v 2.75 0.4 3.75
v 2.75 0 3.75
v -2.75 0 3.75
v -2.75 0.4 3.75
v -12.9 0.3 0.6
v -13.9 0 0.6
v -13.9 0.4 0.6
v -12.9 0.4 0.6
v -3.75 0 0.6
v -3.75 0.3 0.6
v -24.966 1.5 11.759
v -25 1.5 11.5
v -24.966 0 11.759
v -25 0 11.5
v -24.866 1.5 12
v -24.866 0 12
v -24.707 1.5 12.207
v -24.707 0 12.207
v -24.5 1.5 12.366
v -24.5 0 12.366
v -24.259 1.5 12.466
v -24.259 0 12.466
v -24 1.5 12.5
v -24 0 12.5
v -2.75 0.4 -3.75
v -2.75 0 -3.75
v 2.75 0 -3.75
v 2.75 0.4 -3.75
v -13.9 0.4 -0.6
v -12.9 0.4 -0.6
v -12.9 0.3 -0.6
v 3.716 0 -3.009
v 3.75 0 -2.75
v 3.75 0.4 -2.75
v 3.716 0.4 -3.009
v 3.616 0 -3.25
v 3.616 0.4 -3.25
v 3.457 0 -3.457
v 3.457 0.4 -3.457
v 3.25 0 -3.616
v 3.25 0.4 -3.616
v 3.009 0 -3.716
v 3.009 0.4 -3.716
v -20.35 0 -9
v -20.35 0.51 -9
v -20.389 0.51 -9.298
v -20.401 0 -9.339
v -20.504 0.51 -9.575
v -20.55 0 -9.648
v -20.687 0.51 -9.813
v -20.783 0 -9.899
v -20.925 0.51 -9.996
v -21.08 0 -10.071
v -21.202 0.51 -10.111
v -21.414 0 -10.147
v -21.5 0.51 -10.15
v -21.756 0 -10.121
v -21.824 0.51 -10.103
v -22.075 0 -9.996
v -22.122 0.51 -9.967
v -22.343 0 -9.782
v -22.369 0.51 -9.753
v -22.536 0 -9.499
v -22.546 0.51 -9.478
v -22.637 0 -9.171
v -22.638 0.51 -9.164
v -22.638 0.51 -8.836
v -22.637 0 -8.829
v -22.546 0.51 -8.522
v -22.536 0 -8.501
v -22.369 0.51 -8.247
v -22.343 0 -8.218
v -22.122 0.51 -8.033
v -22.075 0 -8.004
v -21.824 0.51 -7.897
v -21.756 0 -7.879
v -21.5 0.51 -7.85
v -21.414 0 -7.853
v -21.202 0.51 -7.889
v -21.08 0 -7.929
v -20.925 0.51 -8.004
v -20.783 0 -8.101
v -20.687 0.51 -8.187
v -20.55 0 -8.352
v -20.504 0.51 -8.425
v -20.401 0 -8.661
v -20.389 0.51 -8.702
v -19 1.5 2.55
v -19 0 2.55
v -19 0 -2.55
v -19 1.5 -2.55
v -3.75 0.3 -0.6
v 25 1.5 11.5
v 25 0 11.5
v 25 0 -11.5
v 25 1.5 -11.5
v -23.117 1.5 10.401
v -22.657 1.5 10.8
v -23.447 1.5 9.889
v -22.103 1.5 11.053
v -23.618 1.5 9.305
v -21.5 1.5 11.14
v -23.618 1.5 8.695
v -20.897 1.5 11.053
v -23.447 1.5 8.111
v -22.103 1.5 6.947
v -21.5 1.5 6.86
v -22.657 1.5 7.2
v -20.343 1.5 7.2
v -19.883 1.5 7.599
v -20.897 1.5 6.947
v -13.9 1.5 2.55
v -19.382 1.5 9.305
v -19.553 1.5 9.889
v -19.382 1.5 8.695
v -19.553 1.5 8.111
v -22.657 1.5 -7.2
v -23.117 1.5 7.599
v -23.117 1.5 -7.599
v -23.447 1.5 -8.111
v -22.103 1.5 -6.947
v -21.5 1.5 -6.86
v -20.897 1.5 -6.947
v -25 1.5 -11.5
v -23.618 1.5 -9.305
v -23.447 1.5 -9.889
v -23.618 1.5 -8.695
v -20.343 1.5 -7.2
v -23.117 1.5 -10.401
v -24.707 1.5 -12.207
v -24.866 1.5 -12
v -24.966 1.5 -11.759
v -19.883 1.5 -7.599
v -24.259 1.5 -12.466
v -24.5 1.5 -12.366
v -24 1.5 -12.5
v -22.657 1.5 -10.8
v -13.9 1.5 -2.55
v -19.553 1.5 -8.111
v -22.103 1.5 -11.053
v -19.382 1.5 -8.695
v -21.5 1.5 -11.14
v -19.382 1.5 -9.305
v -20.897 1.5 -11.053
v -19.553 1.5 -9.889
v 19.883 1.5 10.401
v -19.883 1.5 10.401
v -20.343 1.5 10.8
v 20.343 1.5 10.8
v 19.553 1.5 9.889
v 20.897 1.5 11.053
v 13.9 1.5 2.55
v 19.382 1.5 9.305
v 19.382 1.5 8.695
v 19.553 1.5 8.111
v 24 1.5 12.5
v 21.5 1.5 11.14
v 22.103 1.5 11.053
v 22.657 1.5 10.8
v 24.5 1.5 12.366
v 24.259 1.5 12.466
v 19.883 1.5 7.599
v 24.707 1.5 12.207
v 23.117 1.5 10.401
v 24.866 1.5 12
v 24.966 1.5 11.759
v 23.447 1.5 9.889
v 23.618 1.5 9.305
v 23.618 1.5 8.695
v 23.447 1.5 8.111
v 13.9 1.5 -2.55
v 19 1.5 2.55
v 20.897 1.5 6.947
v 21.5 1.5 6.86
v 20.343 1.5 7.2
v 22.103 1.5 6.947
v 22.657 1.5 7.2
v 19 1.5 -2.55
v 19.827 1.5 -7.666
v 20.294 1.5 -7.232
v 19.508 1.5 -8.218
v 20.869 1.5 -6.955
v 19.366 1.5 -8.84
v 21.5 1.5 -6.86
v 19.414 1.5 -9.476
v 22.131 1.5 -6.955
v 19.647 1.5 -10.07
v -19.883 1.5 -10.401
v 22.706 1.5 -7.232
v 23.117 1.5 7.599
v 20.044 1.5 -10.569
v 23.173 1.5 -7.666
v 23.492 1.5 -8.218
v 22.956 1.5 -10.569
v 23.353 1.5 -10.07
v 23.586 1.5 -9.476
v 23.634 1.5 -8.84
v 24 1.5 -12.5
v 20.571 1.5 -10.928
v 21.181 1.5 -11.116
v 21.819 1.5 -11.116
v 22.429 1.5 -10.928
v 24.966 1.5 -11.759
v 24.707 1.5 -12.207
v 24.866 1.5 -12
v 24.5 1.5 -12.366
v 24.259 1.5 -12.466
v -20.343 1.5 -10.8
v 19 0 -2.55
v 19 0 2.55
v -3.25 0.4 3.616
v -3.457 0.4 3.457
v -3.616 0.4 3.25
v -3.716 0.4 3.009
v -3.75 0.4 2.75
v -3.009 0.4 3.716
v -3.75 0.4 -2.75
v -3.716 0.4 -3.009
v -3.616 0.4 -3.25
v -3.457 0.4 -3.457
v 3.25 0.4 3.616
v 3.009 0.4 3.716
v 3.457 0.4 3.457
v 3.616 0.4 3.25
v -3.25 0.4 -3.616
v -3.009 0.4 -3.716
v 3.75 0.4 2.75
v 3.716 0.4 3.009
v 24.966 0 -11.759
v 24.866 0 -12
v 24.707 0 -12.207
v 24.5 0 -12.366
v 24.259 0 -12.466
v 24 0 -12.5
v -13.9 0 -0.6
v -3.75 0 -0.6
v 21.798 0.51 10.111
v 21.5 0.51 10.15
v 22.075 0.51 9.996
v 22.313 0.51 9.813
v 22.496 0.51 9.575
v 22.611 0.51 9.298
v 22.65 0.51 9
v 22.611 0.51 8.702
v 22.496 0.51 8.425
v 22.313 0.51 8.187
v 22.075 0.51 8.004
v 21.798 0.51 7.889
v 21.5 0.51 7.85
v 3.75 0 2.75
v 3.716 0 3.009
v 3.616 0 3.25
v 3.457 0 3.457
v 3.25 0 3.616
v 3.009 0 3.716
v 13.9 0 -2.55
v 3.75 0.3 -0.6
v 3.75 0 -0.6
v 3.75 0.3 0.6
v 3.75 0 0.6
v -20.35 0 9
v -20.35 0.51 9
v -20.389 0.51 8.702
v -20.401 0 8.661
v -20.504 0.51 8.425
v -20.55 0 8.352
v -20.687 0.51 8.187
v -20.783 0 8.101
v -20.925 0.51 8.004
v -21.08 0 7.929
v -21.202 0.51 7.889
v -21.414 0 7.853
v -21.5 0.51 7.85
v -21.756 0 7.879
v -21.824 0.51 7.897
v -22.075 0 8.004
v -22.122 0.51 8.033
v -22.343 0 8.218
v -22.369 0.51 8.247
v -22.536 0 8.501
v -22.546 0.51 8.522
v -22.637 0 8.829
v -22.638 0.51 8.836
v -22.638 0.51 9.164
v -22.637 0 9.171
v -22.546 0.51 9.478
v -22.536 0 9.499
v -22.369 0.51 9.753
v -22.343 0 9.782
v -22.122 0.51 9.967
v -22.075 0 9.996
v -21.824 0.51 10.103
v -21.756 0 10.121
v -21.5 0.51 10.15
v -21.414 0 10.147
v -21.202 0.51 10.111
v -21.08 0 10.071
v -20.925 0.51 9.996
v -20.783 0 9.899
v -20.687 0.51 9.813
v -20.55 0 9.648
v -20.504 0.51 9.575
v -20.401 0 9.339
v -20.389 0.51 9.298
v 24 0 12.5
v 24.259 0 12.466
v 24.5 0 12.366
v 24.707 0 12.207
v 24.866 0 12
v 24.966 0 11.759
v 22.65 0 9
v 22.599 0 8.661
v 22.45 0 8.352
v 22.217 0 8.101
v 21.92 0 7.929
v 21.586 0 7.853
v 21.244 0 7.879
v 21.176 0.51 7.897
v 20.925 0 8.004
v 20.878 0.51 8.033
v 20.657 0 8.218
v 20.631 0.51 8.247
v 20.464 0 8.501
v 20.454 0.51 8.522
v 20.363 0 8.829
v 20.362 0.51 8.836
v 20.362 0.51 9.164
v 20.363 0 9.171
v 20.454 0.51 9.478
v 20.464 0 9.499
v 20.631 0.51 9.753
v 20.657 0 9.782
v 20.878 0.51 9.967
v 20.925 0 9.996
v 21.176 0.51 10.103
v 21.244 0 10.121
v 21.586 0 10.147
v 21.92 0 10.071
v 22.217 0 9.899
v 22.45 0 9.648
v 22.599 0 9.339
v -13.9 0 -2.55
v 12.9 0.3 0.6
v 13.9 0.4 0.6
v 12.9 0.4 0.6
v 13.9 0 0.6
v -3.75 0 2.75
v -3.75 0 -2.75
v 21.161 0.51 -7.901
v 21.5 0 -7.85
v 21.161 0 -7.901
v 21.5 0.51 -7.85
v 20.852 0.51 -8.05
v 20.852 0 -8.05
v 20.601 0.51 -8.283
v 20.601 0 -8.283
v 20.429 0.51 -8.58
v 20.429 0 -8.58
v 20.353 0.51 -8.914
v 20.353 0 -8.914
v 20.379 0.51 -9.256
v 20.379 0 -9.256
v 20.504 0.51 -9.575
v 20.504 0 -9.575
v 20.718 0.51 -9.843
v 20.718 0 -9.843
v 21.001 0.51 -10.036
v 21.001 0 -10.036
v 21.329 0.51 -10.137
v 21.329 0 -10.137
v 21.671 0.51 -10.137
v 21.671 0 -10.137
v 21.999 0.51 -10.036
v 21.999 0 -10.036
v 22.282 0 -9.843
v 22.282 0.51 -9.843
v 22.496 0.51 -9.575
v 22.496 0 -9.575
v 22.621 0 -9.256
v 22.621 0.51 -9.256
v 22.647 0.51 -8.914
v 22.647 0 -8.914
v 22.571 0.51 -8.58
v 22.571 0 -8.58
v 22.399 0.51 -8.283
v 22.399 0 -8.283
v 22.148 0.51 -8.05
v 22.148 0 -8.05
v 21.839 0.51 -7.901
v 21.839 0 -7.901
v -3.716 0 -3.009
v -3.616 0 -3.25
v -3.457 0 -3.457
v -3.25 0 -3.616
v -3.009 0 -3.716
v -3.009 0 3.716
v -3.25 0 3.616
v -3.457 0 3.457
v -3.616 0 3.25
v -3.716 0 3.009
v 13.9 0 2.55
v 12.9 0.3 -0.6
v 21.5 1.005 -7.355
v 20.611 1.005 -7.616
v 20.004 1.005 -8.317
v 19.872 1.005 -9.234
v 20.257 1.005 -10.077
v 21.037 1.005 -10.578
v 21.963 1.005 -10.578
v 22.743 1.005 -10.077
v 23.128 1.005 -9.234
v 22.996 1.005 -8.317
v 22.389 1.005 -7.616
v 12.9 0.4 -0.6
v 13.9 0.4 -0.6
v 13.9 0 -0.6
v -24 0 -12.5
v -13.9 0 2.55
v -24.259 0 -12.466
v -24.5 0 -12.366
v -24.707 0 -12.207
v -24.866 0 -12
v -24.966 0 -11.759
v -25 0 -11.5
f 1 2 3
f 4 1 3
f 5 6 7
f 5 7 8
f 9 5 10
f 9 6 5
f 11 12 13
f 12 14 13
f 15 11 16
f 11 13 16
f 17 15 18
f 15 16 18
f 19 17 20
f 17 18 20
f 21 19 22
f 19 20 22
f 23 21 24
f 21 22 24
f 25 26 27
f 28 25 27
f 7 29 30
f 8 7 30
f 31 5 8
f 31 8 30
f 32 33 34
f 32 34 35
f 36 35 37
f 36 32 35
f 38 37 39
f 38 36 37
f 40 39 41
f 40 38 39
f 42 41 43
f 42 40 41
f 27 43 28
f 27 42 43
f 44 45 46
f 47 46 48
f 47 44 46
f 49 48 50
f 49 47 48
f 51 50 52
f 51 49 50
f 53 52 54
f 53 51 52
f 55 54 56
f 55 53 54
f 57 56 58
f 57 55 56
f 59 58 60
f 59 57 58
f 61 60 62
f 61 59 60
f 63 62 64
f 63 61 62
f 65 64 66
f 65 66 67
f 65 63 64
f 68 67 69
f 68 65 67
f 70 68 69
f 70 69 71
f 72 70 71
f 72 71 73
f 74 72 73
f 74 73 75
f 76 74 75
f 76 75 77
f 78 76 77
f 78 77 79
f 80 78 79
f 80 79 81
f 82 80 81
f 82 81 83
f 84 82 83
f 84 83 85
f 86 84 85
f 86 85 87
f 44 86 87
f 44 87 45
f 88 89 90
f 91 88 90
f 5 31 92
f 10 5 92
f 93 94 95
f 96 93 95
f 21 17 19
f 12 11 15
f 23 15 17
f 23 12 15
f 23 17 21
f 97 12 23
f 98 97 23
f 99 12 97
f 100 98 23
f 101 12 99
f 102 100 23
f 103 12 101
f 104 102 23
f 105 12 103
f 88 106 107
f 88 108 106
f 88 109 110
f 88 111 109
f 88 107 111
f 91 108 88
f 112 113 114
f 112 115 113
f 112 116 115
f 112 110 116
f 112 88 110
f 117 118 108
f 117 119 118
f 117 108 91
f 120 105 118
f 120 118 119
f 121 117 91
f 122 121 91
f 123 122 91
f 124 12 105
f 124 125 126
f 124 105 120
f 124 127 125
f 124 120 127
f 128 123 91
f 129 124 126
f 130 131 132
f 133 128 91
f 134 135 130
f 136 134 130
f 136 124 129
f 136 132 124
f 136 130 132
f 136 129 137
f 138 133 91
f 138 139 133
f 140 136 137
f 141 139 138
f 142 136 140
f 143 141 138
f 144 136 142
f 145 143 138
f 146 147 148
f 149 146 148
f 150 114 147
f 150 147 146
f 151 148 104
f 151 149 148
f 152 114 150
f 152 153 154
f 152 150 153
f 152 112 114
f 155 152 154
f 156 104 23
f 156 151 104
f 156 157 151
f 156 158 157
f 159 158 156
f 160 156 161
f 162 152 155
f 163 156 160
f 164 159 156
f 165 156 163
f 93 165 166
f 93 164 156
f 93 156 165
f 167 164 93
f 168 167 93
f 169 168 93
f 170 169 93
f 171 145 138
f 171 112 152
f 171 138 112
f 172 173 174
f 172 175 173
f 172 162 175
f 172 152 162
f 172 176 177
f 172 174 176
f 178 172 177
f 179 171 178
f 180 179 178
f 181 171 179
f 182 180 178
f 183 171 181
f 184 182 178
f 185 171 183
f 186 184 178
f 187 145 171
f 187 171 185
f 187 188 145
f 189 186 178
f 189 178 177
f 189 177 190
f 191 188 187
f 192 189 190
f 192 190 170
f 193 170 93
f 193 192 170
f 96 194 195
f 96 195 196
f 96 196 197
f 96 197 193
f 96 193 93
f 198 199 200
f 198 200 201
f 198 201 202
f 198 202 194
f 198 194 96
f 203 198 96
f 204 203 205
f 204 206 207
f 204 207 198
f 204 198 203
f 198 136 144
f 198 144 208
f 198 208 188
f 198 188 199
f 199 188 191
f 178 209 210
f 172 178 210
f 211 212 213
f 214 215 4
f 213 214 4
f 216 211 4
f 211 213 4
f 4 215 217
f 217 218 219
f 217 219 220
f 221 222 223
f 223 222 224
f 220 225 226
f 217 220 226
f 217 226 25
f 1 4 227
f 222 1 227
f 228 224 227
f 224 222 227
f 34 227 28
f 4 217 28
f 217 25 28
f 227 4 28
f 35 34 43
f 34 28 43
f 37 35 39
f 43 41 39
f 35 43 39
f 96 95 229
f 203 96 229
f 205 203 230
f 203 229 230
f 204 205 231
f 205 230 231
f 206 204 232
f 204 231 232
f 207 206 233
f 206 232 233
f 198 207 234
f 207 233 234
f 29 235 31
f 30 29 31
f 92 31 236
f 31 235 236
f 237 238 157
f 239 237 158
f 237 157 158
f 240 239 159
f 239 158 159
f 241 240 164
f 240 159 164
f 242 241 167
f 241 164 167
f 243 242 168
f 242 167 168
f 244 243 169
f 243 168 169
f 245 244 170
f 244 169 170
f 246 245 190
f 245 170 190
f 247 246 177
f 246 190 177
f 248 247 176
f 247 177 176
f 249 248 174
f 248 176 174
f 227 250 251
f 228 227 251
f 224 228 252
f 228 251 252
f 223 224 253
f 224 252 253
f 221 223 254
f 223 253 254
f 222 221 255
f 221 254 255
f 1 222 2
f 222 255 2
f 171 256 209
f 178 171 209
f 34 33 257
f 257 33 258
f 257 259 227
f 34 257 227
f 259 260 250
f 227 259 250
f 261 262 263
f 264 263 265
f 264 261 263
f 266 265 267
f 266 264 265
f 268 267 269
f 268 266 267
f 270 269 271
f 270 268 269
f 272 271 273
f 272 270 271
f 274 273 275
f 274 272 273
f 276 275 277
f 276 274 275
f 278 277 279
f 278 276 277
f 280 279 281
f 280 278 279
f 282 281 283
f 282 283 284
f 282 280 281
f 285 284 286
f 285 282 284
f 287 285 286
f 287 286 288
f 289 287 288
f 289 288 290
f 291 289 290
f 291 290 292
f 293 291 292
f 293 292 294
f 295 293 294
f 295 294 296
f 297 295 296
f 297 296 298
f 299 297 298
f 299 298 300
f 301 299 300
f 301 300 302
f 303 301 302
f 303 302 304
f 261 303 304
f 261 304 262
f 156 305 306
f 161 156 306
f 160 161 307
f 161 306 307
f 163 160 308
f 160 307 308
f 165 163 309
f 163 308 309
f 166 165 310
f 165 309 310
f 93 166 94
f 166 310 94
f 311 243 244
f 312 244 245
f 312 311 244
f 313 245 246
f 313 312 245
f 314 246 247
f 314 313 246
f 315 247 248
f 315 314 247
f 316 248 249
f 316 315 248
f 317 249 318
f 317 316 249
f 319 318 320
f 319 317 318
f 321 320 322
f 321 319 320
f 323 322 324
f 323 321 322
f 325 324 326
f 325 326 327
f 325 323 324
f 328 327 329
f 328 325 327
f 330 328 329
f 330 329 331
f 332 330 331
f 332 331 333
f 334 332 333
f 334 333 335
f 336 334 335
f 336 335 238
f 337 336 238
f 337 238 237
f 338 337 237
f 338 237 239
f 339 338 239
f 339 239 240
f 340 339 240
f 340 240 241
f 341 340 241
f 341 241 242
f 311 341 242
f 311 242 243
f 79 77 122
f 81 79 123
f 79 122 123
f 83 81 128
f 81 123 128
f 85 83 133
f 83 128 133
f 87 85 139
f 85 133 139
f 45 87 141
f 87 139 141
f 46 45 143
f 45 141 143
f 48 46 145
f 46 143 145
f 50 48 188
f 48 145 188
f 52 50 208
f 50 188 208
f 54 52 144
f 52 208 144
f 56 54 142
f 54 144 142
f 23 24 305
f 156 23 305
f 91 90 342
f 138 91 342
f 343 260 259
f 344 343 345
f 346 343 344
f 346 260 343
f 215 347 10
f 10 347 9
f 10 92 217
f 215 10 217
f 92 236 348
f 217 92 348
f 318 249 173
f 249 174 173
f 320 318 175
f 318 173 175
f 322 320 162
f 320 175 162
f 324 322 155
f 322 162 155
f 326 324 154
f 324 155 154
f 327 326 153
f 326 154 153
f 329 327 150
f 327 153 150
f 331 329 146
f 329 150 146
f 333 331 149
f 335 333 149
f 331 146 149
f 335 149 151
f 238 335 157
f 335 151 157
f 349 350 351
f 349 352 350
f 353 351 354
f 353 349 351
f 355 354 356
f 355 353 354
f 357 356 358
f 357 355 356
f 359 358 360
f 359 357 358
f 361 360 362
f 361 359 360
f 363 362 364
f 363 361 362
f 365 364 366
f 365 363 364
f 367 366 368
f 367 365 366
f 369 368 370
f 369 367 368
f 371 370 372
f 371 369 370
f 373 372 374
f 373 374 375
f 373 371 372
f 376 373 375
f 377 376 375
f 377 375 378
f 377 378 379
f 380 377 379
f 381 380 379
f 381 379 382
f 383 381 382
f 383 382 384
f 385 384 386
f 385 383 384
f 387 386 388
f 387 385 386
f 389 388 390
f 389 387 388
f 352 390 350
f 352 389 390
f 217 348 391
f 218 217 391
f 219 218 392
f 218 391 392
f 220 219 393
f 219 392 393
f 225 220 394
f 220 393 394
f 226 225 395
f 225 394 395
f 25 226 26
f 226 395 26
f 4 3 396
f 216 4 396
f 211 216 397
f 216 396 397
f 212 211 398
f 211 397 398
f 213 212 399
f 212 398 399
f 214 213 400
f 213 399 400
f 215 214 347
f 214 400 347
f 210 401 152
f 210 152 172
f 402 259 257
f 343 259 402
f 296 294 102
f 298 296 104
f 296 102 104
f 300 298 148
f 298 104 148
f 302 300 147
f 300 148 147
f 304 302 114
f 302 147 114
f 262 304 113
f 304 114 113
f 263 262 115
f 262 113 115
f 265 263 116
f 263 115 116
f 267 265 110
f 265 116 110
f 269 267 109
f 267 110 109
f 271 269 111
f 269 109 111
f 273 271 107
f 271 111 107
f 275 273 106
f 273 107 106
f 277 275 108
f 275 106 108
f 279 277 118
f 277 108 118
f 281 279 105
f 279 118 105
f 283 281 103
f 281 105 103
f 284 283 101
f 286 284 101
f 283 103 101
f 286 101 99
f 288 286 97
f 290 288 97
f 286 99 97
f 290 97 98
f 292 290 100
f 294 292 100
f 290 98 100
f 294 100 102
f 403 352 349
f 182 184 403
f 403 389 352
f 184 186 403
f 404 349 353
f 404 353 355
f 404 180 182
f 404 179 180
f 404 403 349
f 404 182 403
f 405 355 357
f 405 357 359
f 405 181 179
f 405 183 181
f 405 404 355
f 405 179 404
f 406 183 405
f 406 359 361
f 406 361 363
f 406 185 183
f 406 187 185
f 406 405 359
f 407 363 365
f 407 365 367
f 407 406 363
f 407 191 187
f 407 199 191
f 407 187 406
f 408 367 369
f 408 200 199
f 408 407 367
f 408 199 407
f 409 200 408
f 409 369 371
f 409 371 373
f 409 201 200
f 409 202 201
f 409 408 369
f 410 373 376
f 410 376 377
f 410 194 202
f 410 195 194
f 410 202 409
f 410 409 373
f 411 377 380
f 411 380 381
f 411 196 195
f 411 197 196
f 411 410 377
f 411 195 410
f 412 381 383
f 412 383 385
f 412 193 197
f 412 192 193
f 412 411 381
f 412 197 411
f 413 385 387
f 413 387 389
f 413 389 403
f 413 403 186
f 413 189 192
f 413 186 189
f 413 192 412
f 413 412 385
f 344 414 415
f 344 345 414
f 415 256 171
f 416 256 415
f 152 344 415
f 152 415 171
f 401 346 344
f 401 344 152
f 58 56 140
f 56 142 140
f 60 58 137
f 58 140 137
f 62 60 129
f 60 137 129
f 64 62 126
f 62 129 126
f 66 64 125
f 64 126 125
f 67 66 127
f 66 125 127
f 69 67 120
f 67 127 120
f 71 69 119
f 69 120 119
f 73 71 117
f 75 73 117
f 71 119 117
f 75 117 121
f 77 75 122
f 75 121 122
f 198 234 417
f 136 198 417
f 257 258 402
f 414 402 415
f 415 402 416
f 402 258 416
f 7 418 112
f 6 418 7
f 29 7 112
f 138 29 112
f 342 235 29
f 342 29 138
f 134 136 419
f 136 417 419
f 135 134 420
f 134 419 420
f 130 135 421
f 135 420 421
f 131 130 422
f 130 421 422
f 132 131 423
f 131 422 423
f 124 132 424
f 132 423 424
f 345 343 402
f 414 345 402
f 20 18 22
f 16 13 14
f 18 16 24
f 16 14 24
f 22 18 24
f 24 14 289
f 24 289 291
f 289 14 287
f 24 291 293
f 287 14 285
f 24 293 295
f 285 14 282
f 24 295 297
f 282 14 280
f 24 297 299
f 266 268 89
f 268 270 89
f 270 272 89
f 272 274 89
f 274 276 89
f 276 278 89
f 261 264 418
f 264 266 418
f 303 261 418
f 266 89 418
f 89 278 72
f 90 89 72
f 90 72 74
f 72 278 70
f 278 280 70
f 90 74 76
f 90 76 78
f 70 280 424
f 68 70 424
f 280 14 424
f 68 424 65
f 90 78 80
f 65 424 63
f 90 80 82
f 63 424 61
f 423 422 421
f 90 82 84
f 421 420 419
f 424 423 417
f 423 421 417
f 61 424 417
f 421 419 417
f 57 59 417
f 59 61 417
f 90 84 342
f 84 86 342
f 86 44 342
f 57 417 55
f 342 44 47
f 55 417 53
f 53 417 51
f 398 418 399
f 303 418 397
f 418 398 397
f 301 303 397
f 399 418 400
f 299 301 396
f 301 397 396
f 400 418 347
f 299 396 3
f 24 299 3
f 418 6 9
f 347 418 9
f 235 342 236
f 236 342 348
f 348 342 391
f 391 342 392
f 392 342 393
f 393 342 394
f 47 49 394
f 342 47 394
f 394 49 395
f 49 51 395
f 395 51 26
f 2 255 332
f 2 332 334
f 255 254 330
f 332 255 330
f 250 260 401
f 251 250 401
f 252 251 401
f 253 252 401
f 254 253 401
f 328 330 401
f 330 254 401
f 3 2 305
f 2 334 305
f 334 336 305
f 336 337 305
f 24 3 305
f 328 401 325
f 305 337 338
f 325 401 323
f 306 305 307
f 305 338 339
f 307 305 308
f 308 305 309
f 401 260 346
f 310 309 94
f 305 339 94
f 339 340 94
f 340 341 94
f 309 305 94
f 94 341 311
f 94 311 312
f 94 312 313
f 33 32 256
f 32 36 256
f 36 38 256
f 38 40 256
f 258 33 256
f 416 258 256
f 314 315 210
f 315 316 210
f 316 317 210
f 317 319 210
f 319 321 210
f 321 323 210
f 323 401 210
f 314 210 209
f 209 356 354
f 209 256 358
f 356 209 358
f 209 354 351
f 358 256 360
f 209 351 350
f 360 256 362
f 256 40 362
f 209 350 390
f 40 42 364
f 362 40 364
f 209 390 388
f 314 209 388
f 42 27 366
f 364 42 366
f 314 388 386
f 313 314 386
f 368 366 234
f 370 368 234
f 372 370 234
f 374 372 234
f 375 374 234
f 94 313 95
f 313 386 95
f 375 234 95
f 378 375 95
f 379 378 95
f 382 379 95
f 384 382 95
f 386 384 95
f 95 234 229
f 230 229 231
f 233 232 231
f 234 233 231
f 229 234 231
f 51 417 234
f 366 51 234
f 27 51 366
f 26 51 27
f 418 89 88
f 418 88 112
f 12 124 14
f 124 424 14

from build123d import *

# Parameters (mm, degrees)
BOSS_EXTRUDE1_DEPTH = 1.5
CUT_EXTRUDE14_DEPTH = 0.4
MIRROR1_OUTLINE_R   = 1.15
MIRROR1_DEPTH       = 0.5099999
MIRROR1_START       = 0.4
MIRROR1_2_DEPTH     = 1.1
MIRROR1_START_2     = 0.5099999
MIRROR1_3_DEPTH     = 0.9900001
SKETCH3_W           = 5.1
SKETCH3_H           = 5.1
CUT_EXTRUDE9_DEPTH  = 28.99107001
SKETCH3_8_W         = 1
SKETCH3_8_H         = 0.6
CUT_EXTRUDE13_DEPTH = 0.4
SKETCH3_5_W         = 13.9
SKETCH3_5_H         = 1.2
CUT_EXTRUDE10_DEPTH = 0.3
LID_OUTLINE_W       = 5.1
LID_OUTLINE_H       = 5.1
LID_DEPTH           = 2
LID_2_OUTLINE_W     = 10.15
LID_2_OUTLINE_H     = 1.2
LID_2_DEPTH         = 0.3
LID_START           = 0.3
LID_3_OUTLINE_W     = 1
LID_3_OUTLINE_H     = 1.2
LID_3_DEPTH         = 0.1


with BuildPart() as part:
    # Sketch1 → Boss-Extrude1 (new body)
    with BuildSketch(Plane(origin=(0, 0, 0), x_dir=(1, 0, 0), z_dir=(0, 1, 0))):
        with BuildLine():
            Line((0, 0), (25, 0))
            Line((25, 0), (25, 11.5))
            ThreePointArc((25, 11.5), (24.707106781, 12.207106781), (24, 12.5))
            Line((24, 12.5), (0, 12.5))
            Line((0, 12.5), (0, 0))
        make_face()
    extrude(amount=BOSS_EXTRUDE1_DEPTH)

    # Sketch1<11> → Cut-Extrude14 (cut)
    with BuildSketch(Plane(origin=(0, 0, 0), x_dir=(1, 0, 0), z_dir=(0, 1, 0))):
        with BuildLine():
            Line((0, 3.75), (0, 0))
            Line((0, 0), (3.75, 0))
            Line((3.75, 0), (3.75, 2.75))
            ThreePointArc((3.75, 2.75), (3.457106781, 3.457106781), (2.75, 3.75))
            Line((2.75, 3.75), (0, 3.75))
        make_face()
    extrude(amount=CUT_EXTRUDE14_DEPTH, mode=Mode.SUBTRACT)

    # Sketch11 → CSK for M2 Countersunk Flat Head Screw1 (revolve, cut)
    with BuildSketch(Plane(origin=(21.5, 1.5, -9), x_dir=(0, 0, 1), z_dir=(1, 0, 0))):
        Polygon((0, 0), (0, 1.5), (1.15, 1.5), (1.15, 0.99), (2.14, 0), align=None)
    revolve(axis=Axis((21.5, 7.85, -9), (0, -1, 0)), mode=Mode.SUBTRACT)

    # Mirror1: read off the stored shape, not the designer's step
    # Mirror1 outline → Mirror1 (add)
    with BuildSketch(Plane(origin=(0, 0, 0), x_dir=(1, 0, 0), z_dir=(0, 1, 0))):
        with BuildLine():
            Line((25, -11.5), (25, 0))
            Line((25, 0), (3.75, 0))
            Line((3.75, 0), (3.75, -2.75))
            ThreePointArc((3.75, -2.75), (3.457106781, -3.457106781), (2.75, -3.75))
            Line((2.75, -3.75), (-2.75, -3.75))
            ThreePointArc((-2.75, -3.75), (-3.457106781, -3.457106781), (-3.75, -2.75))
            Line((-3.75, -2.75), (-3.75, 2.75))
            ThreePointArc((-3.75, 2.75), (-3.457106781, 3.457106781), (-2.75, 3.75))
            Line((-2.75, 3.75), (0, 3.75))
            Line((0, 3.75), (0, 12.5))
            Line((0, 12.5), (-24, 12.5))
            ThreePointArc((-24, 12.5), (-24.707106781, 12.207106781), (-25, 11.5))
            Line((-25, 11.5), (-25, -11.5))
            ThreePointArc((-25, -11.5), (-24.707106781, -12.207106781), (-24, -12.5))
            Line((-24, -12.5), (24, -12.5))
            ThreePointArc((24, -12.5), (24.707106781, -12.207106781), (25, -11.5))
        make_face()
        with Locations((-21.5, -9)):
            Circle(MIRROR1_OUTLINE_R, mode=Mode.SUBTRACT)
        with Locations((21.5, -9)):
            Circle(MIRROR1_OUTLINE_R, mode=Mode.SUBTRACT)
        with Locations((-21.5, 9)):
            Circle(MIRROR1_OUTLINE_R, mode=Mode.SUBTRACT)
    extrude(amount=MIRROR1_DEPTH)

    # Mirror1 2 outline → Mirror1 2 (add)
    with BuildSketch(Plane(origin=(0, 0, 0), x_dir=(1, 0, 0), z_dir=(0, 1, 0)).offset(MIRROR1_START)):
        with BuildLine():
            Line((3.75, -2.75), (3.75, 0))
            Line((3.75, 0), (0, 0))
            Line((0, 0), (0, 3.75))
            Line((0, 3.75), (-2.75, 3.75))
            ThreePointArc((-2.75, 3.75), (-3.457106781, 3.457106781), (-3.75, 2.75))
            Line((-3.75, 2.75), (-3.75, -2.75))
            ThreePointArc((-3.75, -2.75), (-3.457106781, -3.457106781), (-2.75, -3.75))
            Line((-2.75, -3.75), (2.75, -3.75))
            ThreePointArc((2.75, -3.75), (3.457106781, -3.457106781), (3.75, -2.75))
        make_face()
    extrude(amount=MIRROR1_2_DEPTH)

    # Mirror1 3 outline → Mirror1 3 (add)
    with BuildSketch(Plane(origin=(0, 0, 0), x_dir=(1, 0, 0), z_dir=(0, 1, 0)).offset(MIRROR1_START_2)):
        with BuildLine():
            Line((25, -11.5), (25, 0))
            Line((25, 0), (3.75, 0))
            Line((3.75, 0), (3.75, -2.75))
            ThreePointArc((3.75, -2.75), (3.457106781, -3.457106781), (2.75, -3.75))
            Line((2.75, -3.75), (-2.75, -3.75))
            ThreePointArc((-2.75, -3.75), (-3.457106781, -3.457106781), (-3.75, -2.75))
            Line((-3.75, -2.75), (-3.75, 2.75))
            ThreePointArc((-3.75, 2.75), (-3.457106781, 3.457106781), (-2.75, 3.75))
            Line((-2.75, 3.75), (0, 3.75))
            Line((0, 3.75), (0, 12.5))
            Line((0, 12.5), (-24, 12.5))
            ThreePointArc((-24, 12.5), (-24.707106781, 12.207106781), (-25, 11.5))
            Line((-25, 11.5), (-25, -11.5))
            ThreePointArc((-25, -11.5), (-24.707106781, -12.207106781), (-24, -12.5))
            Line((-24, -12.5), (24, -12.5))
            ThreePointArc((24, -12.5), (24.707106781, -12.207106781), (25, -11.5))
        make_face()
    extrude(amount=MIRROR1_3_DEPTH)

    # Mirror1 4: loft between two sections, ruled curve by curve
    mirror1_4_from = [
        Edge.make_three_point_arc((-21.5, 0.51, -7.85), (-20.35, 0.51, -9), (-21.5, 0.51, -10.15)),
        Edge.make_three_point_arc((-21.5, 0.51, -10.15), (-22.65, 0.51, -9), (-21.5, 0.51, -7.85)),
    ]
    mirror1_4_to = [
        Edge.make_three_point_arc((-21.5, 1.5, -6.86), (-19.36, 1.5, -9), (-21.5, 1.5, -11.14)),
        Edge.make_three_point_arc((-21.5, 1.5, -11.14), (-23.64, 1.5, -9), (-21.5, 1.5, -6.86)),
    ]
    mirror1_4 = Solid(Shell([*[Face.make_surface_from_curves(mirror1_4_from[k], mirror1_4_to[k]) for k in range(2)], Face(Wire(mirror1_4_from)), Face(Wire(mirror1_4_to))]))
    add(mirror1_4, mode=Mode.SUBTRACT)

    # Mirror1 5: loft between two sections, ruled curve by curve
    mirror1_5_from = [
        Edge.make_three_point_arc((21.5, 0.51, 7.85), (20.35, 0.51, 9), (21.5, 0.51, 10.15)),
        Edge.make_three_point_arc((21.5, 0.51, 10.15), (22.65, 0.51, 9), (21.5, 0.51, 7.85)),
    ]
    mirror1_5_to = [
        Edge.make_three_point_arc((21.5, 1.5, 6.86), (19.36, 1.5, 9), (21.5, 1.5, 11.14)),
        Edge.make_three_point_arc((21.5, 1.5, 11.14), (23.64, 1.5, 9), (21.5, 1.5, 6.86)),
    ]
    mirror1_5 = Solid(Shell([*[Face.make_surface_from_curves(mirror1_5_from[k], mirror1_5_to[k]) for k in range(2)], Face(Wire(mirror1_5_from)), Face(Wire(mirror1_5_to))]))
    add(mirror1_5, mode=Mode.SUBTRACT)

    # Mirror1 6: loft between two sections, ruled curve by curve
    mirror1_6_from = [
        Edge.make_three_point_arc((-21.5, 0.51, 7.85), (-22.65, 0.51, 9), (-21.5, 0.51, 10.15)),
        Edge.make_three_point_arc((-21.5, 0.51, 10.15), (-20.35, 0.51, 9), (-21.5, 0.51, 7.85)),
    ]
    mirror1_6_to = [
        Edge.make_three_point_arc((-21.5, 1.5, 6.86), (-23.64, 1.5, 9), (-21.5, 1.5, 11.14)),
        Edge.make_three_point_arc((-21.5, 1.5, 11.14), (-19.36, 1.5, 9), (-21.5, 1.5, 6.86)),
    ]
    mirror1_6 = Solid(Shell([*[Face.make_surface_from_curves(mirror1_6_from[k], mirror1_6_to[k]) for k in range(2)], Face(Wire(mirror1_6_from)), Face(Wire(mirror1_6_to))]))
    add(mirror1_6, mode=Mode.SUBTRACT)

    # Sketch3 → Cut-Extrude9 (cut, through all)
    with BuildSketch(Plane.XZ):
        with Locations((16.45, 0)):
            Rectangle(SKETCH3_W, SKETCH3_H)
    extrude(amount=-CUT_EXTRUDE9_DEPTH, mode=Mode.SUBTRACT)

    # Sketch3<8> → Cut-Extrude13 (cut)
    with BuildSketch(Plane.XZ):
        with Locations((13.4, -0.3)):
            Rectangle(SKETCH3_8_W, SKETCH3_8_H)
        with Locations((13.4, 0.3)):
            Rectangle(SKETCH3_8_W, SKETCH3_8_H)
    extrude(amount=-CUT_EXTRUDE13_DEPTH, mode=Mode.SUBTRACT)

    # Sketch3<5> → Cut-Extrude10 (cut)
    with BuildSketch(Plane.XZ):
        with Locations((6.95, 0)):
            Rectangle(SKETCH3_5_W, SKETCH3_5_H)
    extrude(amount=-CUT_EXTRUDE10_DEPTH, mode=Mode.SUBTRACT)

    # lid: read off the stored shape, not the designer's step
    # lid outline → lid (cut)
    with BuildSketch(Plane(origin=(0, 0, 0), x_dir=(1, 0, 0), z_dir=(0, 1, 0))):
        with Locations((-16.45, 0)):
            Rectangle(LID_OUTLINE_W, LID_OUTLINE_H)
    extrude(amount=LID_DEPTH, mode=Mode.SUBTRACT)

    # lid 2 outline → lid 2 (cut)
    with BuildSketch(Plane(origin=(0, 0, 0), x_dir=(1, 0, 0), z_dir=(0, 1, 0))):
        with Locations((-8.825, 0)):
            Rectangle(LID_2_OUTLINE_W, LID_2_OUTLINE_H)
    extrude(amount=LID_2_DEPTH, mode=Mode.SUBTRACT)

    # lid 3 outline → lid 3 (cut)
    with BuildSketch(Plane(origin=(0, 0, 0), x_dir=(1, 0, 0), z_dir=(0, 1, 0)).offset(LID_START)):
        with Locations((-13.4, 0)):
            Rectangle(LID_3_OUTLINE_W, LID_3_OUTLINE_H)
    extrude(amount=LID_3_DEPTH, mode=Mode.SUBTRACT)


solid = part.part
